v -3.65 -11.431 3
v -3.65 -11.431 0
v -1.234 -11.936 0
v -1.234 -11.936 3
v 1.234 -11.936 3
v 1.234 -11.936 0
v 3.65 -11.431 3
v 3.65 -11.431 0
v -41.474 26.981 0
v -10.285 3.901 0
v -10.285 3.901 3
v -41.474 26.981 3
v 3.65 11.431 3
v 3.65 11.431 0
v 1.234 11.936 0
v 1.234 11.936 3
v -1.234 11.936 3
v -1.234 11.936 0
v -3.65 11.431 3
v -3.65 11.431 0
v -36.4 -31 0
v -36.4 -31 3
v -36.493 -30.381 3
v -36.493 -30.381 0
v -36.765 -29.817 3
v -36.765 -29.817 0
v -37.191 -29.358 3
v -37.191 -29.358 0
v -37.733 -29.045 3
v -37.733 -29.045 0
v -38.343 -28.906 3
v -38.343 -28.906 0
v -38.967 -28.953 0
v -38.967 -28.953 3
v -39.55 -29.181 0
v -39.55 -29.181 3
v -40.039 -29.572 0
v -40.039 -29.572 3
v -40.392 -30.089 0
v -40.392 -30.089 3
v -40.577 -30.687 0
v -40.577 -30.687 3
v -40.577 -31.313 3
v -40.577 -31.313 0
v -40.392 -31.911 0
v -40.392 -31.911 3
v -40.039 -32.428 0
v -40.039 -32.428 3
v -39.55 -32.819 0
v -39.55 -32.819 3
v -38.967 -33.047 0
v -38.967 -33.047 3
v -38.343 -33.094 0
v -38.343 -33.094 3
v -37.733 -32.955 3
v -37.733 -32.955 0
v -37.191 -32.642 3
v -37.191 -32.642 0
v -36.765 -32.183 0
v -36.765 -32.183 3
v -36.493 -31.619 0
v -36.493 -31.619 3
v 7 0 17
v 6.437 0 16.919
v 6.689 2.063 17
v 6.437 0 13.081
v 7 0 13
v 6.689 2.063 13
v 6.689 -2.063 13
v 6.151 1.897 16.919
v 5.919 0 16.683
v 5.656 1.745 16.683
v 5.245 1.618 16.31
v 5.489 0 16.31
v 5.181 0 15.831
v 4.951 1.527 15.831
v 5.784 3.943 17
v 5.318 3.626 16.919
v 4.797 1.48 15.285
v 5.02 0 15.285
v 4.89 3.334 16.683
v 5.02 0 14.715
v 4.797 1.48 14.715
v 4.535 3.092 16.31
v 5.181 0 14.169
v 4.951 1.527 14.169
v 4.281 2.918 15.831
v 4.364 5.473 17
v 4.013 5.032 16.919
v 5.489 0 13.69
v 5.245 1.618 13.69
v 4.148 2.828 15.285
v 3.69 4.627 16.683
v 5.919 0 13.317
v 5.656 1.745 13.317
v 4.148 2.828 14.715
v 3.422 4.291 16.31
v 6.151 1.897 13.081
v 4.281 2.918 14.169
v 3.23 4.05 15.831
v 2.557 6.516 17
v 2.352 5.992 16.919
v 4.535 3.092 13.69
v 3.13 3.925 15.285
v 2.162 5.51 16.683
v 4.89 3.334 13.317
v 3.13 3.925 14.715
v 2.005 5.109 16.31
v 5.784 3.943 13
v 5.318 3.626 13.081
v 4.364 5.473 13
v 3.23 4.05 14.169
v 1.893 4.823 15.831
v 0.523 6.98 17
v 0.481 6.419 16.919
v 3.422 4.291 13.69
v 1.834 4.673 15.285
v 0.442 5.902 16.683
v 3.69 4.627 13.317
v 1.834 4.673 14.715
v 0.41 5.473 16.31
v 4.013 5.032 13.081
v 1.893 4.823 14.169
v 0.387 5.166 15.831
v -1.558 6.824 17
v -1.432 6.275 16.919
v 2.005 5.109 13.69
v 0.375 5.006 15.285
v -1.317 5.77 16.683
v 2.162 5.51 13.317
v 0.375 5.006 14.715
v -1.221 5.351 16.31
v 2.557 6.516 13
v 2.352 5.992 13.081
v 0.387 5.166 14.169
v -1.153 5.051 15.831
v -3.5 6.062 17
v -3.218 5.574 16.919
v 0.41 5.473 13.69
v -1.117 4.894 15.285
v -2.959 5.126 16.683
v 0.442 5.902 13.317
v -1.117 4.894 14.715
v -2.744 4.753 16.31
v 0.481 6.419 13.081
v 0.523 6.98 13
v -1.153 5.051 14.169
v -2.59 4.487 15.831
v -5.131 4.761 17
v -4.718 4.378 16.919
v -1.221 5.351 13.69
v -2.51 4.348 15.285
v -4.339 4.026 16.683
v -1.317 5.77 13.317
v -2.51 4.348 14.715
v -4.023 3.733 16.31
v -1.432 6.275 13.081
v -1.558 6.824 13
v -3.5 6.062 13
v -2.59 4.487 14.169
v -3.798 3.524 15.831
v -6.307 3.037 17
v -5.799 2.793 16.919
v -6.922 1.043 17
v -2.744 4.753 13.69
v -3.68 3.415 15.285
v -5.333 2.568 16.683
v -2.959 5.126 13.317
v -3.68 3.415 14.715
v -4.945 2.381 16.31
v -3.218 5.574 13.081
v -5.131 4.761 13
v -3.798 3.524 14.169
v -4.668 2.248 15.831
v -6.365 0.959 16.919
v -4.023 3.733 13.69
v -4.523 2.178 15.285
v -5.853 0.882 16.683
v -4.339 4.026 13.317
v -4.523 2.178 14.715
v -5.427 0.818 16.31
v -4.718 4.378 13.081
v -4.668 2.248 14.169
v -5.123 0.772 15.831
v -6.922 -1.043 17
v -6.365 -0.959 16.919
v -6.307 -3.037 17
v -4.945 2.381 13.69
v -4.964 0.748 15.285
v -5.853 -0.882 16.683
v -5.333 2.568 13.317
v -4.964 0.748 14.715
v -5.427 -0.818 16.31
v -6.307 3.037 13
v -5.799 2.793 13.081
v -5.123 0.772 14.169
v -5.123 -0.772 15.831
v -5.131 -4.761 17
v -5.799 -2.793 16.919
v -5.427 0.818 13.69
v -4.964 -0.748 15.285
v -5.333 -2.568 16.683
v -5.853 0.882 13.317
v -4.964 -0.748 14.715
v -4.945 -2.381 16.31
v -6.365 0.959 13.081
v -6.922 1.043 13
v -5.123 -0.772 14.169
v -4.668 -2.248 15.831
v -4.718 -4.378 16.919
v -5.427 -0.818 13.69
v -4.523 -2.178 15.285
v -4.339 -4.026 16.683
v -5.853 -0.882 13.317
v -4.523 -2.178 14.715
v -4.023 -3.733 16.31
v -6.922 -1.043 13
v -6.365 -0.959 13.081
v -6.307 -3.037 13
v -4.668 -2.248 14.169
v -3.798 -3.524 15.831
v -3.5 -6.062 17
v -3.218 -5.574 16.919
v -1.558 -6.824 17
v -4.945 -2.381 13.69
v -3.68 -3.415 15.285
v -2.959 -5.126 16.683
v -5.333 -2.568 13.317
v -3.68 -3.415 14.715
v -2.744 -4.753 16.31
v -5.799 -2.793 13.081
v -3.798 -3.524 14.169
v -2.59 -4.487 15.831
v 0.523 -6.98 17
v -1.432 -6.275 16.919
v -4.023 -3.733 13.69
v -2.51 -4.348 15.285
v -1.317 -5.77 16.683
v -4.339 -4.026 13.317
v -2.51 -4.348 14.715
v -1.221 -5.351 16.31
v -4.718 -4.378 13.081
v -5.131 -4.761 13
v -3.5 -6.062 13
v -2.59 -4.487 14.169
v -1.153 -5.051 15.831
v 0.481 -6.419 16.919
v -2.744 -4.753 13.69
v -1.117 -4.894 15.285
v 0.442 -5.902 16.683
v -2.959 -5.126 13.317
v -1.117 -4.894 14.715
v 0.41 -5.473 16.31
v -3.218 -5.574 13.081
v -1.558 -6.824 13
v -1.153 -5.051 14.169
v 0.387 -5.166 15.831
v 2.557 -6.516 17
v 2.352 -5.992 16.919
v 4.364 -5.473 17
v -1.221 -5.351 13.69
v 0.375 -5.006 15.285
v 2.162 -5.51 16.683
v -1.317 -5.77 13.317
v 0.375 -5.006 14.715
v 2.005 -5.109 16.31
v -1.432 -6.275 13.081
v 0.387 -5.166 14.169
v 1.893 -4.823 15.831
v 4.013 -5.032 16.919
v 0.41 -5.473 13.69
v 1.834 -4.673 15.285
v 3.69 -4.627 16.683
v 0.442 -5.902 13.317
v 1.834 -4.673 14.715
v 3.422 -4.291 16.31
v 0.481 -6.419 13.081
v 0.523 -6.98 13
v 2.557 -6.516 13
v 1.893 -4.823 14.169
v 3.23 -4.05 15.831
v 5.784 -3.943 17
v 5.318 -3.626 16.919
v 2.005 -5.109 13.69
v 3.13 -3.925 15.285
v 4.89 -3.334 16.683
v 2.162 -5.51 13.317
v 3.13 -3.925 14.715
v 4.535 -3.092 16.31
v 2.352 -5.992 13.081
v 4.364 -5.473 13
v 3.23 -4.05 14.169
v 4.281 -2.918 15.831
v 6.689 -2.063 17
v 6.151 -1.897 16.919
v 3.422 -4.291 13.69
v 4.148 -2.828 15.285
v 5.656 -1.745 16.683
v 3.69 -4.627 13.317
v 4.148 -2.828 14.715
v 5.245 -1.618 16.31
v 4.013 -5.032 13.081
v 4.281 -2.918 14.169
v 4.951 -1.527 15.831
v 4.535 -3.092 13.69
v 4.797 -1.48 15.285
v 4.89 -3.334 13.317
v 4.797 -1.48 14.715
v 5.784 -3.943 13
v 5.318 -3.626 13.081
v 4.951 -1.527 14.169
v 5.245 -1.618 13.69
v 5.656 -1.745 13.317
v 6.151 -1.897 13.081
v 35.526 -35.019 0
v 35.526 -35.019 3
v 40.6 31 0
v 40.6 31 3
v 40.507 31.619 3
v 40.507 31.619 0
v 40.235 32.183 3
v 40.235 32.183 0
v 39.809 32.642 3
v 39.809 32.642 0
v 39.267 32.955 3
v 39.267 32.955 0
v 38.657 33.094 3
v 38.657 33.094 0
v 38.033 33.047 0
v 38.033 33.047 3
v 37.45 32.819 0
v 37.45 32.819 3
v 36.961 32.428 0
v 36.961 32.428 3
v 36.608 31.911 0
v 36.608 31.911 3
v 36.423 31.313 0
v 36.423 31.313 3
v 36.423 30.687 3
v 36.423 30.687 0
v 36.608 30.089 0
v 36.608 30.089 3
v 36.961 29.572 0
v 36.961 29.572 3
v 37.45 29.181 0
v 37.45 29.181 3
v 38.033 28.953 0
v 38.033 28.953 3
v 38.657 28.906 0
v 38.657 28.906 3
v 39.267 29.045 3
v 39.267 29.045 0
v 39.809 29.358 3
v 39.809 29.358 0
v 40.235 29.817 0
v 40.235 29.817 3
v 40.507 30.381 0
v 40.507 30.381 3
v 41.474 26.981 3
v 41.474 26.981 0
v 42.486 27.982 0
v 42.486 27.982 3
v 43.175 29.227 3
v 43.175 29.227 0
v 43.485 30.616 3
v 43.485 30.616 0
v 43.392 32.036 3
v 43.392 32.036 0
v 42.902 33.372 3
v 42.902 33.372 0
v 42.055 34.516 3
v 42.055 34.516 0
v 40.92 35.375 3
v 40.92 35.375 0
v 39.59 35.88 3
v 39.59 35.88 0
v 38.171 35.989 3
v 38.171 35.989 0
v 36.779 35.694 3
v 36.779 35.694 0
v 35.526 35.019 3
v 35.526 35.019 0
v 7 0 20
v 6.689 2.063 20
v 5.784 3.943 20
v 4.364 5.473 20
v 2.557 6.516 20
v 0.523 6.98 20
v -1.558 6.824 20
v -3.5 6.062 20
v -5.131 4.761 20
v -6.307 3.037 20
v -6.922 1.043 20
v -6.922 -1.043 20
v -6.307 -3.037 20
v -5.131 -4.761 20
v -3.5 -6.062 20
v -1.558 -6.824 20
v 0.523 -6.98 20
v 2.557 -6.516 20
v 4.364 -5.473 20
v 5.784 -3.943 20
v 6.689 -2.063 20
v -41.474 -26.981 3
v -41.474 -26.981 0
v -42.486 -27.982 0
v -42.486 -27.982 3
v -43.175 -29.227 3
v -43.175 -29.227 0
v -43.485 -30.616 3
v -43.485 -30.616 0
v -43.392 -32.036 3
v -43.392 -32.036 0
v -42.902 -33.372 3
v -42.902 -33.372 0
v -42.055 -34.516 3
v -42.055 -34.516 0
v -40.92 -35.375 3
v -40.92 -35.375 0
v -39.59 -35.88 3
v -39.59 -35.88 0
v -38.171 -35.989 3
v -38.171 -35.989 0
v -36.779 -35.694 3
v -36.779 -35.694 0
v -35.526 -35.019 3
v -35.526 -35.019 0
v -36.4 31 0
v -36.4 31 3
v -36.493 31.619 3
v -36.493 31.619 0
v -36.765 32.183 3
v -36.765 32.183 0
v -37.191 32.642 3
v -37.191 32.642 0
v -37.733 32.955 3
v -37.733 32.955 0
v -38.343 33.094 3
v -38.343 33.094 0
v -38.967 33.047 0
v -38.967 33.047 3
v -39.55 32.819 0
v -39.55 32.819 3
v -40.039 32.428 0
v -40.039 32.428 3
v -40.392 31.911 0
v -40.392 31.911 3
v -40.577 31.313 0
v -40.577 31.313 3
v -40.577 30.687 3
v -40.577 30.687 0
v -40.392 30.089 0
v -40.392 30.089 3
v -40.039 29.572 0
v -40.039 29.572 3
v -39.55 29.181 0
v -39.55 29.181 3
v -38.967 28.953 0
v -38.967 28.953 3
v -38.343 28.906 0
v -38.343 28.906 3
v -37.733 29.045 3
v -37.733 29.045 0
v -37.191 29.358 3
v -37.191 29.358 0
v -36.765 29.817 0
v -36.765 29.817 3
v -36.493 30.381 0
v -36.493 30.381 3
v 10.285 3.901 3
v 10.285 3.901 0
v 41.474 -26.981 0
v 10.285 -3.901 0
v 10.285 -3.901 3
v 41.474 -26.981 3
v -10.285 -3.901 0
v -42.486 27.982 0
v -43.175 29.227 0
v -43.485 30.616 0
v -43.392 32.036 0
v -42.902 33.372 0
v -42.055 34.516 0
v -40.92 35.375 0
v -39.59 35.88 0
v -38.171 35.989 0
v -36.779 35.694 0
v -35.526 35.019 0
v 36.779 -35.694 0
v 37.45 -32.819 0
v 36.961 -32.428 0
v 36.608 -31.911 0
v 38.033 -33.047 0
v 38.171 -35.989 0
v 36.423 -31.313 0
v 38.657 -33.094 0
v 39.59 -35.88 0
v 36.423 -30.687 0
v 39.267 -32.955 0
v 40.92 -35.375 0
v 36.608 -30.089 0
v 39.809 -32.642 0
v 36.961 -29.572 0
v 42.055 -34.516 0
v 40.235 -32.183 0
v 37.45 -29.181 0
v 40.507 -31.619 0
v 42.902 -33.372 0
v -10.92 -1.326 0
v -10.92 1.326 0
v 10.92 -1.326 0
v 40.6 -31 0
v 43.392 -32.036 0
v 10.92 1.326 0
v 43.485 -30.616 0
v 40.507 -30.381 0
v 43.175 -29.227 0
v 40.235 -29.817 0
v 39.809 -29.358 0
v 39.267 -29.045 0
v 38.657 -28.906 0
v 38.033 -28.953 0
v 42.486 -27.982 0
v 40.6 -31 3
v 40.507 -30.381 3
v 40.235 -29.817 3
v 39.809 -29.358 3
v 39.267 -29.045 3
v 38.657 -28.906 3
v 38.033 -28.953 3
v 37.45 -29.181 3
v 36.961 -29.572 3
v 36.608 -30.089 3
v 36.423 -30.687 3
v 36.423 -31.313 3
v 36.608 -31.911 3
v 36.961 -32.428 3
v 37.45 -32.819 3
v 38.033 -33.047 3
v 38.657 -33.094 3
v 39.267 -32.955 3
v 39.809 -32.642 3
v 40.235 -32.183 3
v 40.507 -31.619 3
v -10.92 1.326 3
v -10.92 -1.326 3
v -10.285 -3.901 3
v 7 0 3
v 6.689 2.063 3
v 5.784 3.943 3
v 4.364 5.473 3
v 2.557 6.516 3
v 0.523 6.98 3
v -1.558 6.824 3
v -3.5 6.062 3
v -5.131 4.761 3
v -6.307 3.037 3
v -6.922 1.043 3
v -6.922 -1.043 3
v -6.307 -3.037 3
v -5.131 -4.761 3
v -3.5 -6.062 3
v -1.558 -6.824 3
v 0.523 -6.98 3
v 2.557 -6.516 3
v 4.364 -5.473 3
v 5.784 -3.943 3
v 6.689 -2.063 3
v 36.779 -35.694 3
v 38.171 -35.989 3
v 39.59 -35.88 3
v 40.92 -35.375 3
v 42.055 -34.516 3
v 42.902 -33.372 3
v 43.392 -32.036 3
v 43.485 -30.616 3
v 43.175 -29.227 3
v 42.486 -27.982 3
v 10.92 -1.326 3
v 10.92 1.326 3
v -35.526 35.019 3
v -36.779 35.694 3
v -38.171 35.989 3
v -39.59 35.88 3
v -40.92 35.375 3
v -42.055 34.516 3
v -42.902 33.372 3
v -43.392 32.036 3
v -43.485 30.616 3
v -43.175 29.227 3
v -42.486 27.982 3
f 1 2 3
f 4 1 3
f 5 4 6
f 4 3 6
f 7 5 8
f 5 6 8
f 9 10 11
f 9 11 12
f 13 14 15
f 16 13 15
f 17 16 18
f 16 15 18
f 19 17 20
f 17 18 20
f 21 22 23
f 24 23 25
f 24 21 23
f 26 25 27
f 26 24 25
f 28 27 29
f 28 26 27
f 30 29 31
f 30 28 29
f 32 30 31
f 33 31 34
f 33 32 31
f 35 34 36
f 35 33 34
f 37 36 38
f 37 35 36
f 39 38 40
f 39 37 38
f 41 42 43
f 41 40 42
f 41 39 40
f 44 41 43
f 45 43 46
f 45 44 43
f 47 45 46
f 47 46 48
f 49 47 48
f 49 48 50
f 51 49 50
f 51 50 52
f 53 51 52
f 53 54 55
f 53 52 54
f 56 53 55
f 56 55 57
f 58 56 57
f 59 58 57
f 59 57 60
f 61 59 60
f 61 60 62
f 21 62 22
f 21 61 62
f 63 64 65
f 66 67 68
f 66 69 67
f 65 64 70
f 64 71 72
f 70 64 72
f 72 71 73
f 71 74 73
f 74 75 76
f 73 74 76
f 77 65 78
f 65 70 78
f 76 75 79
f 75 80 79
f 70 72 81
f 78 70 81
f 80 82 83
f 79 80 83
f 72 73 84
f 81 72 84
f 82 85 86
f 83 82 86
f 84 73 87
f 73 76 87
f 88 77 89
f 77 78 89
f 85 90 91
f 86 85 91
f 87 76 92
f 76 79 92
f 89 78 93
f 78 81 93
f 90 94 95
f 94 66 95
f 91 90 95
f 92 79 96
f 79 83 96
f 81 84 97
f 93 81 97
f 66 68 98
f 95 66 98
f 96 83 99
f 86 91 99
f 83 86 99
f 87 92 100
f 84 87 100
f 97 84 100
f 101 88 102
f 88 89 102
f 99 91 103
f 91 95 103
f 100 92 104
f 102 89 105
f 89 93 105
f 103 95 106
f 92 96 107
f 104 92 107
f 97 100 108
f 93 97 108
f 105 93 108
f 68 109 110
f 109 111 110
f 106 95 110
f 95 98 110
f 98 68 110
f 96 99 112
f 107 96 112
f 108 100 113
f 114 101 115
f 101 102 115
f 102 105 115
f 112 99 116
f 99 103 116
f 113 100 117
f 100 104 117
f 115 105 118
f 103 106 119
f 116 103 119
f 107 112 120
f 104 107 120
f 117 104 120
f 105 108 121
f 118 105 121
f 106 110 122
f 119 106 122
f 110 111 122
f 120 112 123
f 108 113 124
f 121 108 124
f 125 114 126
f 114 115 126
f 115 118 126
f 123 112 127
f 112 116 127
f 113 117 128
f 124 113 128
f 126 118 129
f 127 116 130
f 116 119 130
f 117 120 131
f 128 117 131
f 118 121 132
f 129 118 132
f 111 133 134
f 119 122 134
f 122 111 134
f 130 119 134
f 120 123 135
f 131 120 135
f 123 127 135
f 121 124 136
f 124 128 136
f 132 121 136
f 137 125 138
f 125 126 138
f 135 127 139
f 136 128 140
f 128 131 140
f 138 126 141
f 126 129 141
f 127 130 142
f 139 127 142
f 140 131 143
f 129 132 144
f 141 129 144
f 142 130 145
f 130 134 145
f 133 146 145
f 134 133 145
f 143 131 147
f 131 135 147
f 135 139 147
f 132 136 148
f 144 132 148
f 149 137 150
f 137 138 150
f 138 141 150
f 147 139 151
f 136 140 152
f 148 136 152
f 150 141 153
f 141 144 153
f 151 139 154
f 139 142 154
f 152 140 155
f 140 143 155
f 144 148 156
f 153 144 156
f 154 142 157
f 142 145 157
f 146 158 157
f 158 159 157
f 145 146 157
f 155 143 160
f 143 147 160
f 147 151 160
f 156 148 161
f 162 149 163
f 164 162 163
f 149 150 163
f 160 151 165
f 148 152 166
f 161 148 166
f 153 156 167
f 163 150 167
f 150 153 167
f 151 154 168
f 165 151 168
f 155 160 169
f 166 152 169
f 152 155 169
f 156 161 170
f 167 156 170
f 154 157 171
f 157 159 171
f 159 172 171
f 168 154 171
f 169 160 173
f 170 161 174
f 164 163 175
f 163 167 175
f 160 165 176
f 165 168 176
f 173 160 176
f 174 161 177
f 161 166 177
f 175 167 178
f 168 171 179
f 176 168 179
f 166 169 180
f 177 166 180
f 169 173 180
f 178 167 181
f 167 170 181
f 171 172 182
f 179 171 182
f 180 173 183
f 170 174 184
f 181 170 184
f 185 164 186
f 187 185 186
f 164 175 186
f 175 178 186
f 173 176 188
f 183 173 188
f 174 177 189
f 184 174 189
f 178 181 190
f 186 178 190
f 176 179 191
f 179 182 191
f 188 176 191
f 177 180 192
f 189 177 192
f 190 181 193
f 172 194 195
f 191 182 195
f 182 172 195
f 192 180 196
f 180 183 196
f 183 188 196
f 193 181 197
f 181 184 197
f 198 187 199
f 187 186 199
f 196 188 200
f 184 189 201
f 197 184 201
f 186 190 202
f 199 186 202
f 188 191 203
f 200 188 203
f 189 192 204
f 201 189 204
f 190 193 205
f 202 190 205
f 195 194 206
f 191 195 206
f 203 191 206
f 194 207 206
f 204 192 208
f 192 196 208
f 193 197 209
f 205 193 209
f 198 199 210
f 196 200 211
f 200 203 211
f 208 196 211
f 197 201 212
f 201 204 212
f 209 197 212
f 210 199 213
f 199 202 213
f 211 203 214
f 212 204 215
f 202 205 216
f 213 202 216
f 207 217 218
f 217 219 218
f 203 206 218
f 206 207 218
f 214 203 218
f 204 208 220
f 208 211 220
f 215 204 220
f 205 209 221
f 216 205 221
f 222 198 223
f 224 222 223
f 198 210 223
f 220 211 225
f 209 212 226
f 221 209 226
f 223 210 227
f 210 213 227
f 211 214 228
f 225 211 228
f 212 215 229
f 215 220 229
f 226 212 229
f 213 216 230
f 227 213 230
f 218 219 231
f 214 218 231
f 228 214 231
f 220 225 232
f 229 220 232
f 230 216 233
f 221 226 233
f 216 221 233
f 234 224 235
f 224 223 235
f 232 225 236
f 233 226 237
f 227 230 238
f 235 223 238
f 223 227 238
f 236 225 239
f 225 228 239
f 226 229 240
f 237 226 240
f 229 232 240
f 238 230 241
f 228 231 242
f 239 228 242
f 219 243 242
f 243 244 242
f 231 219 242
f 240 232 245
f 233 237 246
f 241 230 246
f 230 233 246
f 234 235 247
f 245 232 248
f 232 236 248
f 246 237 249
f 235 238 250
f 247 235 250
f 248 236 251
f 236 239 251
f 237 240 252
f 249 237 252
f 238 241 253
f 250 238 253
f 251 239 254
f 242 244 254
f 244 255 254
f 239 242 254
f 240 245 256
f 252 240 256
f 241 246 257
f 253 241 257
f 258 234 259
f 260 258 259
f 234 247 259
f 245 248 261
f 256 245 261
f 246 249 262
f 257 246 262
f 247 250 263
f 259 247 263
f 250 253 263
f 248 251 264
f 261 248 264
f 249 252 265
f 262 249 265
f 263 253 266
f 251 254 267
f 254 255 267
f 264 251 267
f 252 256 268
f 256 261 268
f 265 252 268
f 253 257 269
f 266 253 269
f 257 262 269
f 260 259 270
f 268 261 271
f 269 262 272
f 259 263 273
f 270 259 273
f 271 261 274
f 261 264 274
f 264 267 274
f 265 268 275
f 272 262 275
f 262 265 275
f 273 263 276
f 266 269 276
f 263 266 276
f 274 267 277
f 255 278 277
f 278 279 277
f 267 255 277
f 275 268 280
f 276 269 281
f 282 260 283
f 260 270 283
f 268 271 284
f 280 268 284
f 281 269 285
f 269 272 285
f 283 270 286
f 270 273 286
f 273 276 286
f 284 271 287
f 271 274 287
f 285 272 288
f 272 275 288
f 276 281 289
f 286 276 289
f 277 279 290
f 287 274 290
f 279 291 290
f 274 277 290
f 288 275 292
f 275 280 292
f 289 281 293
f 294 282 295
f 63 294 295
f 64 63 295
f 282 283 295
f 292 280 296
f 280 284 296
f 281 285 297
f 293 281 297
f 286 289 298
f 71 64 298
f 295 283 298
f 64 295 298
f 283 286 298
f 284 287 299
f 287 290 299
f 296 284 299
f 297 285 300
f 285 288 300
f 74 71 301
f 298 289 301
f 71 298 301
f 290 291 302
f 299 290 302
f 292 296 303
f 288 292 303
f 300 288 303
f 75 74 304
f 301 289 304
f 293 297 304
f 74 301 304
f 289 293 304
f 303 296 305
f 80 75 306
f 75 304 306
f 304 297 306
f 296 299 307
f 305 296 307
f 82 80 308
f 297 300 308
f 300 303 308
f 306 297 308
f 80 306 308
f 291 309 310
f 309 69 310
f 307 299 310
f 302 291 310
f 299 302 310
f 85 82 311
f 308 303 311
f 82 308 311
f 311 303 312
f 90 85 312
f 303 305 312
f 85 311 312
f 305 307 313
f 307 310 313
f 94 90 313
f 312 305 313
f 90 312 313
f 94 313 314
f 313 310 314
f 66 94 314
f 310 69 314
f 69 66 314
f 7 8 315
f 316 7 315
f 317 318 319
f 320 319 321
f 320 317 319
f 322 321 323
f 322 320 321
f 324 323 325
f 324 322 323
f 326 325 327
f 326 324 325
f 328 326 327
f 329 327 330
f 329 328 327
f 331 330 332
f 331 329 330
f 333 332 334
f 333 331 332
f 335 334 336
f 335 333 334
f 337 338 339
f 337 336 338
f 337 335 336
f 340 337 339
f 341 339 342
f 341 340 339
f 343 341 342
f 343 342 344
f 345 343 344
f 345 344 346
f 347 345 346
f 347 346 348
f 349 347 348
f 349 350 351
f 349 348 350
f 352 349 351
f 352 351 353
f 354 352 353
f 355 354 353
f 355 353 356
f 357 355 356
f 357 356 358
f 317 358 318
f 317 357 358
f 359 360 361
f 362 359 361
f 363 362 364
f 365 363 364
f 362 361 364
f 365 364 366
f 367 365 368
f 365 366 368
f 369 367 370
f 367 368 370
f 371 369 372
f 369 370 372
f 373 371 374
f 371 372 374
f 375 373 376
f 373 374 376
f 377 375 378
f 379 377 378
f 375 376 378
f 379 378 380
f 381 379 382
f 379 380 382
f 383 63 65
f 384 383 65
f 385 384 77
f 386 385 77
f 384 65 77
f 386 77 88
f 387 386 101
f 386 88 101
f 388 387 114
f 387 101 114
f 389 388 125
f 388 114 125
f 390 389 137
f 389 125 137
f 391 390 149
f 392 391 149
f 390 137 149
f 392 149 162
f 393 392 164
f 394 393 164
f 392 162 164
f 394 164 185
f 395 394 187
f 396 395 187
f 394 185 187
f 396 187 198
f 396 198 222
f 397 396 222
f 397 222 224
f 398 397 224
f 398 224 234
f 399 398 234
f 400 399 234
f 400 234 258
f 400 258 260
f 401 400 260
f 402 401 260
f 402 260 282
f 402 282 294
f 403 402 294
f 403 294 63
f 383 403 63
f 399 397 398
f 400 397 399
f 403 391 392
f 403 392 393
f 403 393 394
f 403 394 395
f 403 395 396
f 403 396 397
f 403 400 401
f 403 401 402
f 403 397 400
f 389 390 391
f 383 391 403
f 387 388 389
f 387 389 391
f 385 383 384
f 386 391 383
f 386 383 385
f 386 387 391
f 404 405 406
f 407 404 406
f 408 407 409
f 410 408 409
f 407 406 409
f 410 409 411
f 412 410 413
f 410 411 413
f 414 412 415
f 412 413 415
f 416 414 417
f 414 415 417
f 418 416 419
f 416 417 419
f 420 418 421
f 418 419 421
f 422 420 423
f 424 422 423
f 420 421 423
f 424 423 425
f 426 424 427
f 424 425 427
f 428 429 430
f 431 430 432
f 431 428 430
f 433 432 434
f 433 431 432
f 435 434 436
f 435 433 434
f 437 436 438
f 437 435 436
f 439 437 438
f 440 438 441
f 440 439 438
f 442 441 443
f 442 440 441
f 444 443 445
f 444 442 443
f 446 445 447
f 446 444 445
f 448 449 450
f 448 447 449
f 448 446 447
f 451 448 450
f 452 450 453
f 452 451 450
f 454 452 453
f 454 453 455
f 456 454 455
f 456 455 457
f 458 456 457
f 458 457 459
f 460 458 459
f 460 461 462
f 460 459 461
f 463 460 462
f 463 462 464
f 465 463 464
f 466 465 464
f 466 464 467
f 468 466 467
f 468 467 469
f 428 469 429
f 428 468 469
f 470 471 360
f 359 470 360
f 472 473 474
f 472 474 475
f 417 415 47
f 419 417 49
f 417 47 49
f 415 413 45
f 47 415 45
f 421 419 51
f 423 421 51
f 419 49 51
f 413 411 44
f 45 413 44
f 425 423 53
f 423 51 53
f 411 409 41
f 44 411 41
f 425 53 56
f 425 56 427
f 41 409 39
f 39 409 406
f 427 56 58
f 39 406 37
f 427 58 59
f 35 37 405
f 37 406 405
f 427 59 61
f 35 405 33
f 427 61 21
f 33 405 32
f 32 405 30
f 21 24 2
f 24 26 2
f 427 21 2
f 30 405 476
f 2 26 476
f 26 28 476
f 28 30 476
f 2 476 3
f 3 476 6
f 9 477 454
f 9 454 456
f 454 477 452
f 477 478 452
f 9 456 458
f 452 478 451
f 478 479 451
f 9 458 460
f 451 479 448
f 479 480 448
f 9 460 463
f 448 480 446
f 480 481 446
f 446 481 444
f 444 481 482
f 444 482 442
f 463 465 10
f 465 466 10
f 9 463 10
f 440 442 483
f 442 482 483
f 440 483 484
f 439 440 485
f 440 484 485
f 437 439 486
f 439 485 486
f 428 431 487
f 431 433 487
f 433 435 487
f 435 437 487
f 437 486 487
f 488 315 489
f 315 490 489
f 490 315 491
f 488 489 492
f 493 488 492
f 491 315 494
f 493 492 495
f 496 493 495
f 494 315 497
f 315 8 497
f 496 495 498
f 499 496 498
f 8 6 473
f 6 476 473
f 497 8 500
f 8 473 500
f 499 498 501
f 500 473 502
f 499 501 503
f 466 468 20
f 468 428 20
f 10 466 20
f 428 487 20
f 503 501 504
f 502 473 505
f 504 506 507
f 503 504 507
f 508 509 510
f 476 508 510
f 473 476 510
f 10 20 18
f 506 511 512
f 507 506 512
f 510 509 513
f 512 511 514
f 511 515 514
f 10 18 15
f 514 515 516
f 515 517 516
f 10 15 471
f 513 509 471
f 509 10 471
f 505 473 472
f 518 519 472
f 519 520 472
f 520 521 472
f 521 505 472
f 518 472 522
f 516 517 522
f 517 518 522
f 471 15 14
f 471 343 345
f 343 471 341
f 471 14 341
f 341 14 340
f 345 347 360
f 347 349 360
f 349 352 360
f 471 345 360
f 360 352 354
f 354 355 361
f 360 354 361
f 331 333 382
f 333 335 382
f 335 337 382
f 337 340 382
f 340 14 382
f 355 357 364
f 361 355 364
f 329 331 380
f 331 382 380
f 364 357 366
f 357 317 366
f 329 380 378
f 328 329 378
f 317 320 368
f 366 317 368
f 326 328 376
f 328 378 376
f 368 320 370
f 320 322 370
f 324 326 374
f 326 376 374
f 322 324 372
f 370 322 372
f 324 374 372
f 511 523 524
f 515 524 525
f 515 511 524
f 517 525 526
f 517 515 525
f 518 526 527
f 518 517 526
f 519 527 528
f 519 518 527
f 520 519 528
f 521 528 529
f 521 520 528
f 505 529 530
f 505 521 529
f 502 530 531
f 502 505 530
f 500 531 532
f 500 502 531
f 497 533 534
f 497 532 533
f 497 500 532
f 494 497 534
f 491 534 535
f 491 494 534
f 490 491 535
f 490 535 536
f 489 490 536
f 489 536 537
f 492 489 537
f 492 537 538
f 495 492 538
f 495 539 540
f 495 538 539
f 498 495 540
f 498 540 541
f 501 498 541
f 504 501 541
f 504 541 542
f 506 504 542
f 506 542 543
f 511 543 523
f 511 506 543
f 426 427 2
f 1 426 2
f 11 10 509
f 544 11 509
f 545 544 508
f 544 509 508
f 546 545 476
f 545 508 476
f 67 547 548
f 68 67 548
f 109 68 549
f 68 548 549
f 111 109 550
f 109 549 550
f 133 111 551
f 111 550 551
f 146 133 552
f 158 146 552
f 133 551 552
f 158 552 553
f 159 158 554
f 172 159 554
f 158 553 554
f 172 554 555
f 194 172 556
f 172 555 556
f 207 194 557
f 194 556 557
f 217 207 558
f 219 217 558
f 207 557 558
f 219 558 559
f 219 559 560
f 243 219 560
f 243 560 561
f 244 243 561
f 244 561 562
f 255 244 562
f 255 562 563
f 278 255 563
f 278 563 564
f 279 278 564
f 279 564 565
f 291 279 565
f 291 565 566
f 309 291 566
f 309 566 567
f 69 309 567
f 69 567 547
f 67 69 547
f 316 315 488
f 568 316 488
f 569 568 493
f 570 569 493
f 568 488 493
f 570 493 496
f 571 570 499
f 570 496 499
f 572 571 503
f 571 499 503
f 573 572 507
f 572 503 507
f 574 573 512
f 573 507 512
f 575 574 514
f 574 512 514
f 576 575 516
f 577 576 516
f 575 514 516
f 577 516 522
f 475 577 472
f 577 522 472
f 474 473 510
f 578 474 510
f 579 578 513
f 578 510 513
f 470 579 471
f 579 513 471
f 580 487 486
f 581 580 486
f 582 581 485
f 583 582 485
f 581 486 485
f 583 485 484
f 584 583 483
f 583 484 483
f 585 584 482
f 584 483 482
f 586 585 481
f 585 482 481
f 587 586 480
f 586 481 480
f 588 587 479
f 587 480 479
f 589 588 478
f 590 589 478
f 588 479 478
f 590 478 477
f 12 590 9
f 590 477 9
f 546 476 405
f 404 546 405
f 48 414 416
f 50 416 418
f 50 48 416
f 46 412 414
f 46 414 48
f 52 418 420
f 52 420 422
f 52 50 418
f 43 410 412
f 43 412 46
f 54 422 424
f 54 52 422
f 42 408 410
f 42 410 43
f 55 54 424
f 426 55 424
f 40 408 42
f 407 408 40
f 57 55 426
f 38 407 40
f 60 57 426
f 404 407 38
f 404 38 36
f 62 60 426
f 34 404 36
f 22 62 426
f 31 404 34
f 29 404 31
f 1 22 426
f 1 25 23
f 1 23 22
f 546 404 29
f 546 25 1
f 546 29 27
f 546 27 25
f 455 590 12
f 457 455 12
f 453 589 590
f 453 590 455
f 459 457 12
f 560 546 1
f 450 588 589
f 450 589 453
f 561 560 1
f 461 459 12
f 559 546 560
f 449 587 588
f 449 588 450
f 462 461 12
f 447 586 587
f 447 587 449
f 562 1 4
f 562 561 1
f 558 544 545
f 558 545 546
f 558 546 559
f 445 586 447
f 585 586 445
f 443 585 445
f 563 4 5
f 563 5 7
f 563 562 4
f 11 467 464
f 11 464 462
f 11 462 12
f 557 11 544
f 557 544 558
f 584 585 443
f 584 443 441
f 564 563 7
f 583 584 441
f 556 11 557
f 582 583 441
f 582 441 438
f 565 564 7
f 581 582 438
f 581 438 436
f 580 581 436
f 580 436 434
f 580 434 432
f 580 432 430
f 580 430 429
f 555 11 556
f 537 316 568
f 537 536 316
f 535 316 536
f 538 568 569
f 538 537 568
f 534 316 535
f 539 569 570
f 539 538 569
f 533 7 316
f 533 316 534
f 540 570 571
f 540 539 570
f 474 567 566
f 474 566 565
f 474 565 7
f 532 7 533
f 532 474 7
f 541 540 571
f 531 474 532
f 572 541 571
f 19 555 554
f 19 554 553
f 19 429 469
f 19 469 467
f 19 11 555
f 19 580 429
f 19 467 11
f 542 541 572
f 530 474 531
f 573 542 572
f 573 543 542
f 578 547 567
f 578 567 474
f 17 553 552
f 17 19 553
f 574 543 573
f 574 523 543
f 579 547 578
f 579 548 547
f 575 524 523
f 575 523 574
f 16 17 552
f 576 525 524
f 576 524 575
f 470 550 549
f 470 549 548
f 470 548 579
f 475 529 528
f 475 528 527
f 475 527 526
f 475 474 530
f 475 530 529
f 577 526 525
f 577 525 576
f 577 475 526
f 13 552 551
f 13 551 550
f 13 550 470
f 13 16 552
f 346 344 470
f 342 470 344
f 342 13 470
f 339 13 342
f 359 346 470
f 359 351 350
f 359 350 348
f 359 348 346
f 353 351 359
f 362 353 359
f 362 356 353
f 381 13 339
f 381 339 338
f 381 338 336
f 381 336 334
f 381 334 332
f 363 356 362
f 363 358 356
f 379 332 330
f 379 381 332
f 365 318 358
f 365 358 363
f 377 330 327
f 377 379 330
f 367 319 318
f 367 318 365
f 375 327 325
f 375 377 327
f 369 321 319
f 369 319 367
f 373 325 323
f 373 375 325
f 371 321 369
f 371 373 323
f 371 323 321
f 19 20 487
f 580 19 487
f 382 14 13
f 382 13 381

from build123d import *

# Parameters (mm, degrees)
TORUS_R           = 2
CYLINDER001_R     = 2.1
CYLINDER001_DEPTH = 10
ARRAY_X_COUNT     = 2
ARRAY_X_PITCH     = 77
ARRAY_Y_COUNT     = 2
ARRAY_Y_PITCH     = 62
PAD002_DEPTH      = 3
CYLINDER_R        = 7
CYLINDER_DEPTH    = 20


with BuildPart() as torus:
    # Torus → Torus (revolve)
    with BuildSketch(Plane(origin=(0, 0, 15), x_dir=(1, 0, 0), z_dir=(0, -1, 0))):
        with Locations((7, 0)):
            Circle(TORUS_R)
    revolve(axis=Axis((0, 0, 15), (0, 0, 1)))


with BuildPart() as extract_fusion:
    # Cylinder001 → Cylinder001 (new body)
    with BuildSketch(Plane.XY):
        Circle(CYLINDER001_R)
    extrude(amount=CYLINDER001_DEPTH)

    # Array X: extract fusion ×2


with BuildPart() as extract_fusion_1:
    add(extract_fusion.part)
    with Locations(*[(i * ARRAY_X_PITCH, 0, 0) for i in range(1, ARRAY_X_COUNT)]):
        add(extract_fusion.part)

    # Array Y: extract fusion ×2


with BuildPart() as extract_fusion_2:
    add(extract_fusion_1.part)
    with Locations(*[(0, i * ARRAY_Y_PITCH, 0) for i in range(1, ARRAY_Y_COUNT)]):
        add(extract_fusion_1.part)


with BuildPart() as extract_fusion_3:
    # Array placement: moved
    add(extract_fusion_2.part.moved(Location((-38.5, -31, 0))))

    # Fusion: union Torus
    add(torus.part)


with BuildPart() as base_body:
    # Sketch002 → Pad002 (new body)
    with BuildSketch(Plane.XY):
        with BuildLine():
            Line((-10.285127, -3.90079), (-41.474221, -26.980795))
            ThreePointArc((-41.474221, -26.980795), (-42.519205, -33.974221), (-35.525779, -35.019205))
            Line((-35.525779, -35.019205), (-3.650353, -11.431313))
            ThreePointArc((-3.650353, -11.431313), (0, -12), (3.650353, -11.431313))
            Line((3.650353, -11.431313), (35.525779, -35.019205))
            ThreePointArc((35.525779, -35.019205), (42.519205, -33.974221), (41.474221, -26.980795))
            Line((10.285127, -3.90079), (41.474221, -26.980795))
            ThreePointArc((10.285127, -3.90079), (11, 0), (10.285127, 3.90079))
            Line((10.285127, 3.90079), (41.474221, 26.980795))
            ThreePointArc((41.474221, 26.980795), (42.519205, 33.974221), (35.525779, 35.019205))
            Line((3.650353, 11.431313), (35.525779, 35.019205))
            ThreePointArc((3.650353, 11.431313), (0, 12), (-3.650353, 11.431313))
            Line((-3.650353, 11.431313), (-35.525779, 35.019205))
            ThreePointArc((-35.525779, 35.019205), (-42.519205, 33.974221), (-41.474221, 26.980795))
            Line((-10.285127, 3.90079), (-41.474221, 26.980795))
            ThreePointArc((-10.285127, 3.90079), (-11, 0), (-10.285127, -3.90079))
        make_face()
    extrude(amount=PAD002_DEPTH)


with BuildPart() as base_cut:
    # Cylinder → Cylinder (new body)
    with BuildSketch(Plane.XY):
        Circle(CYLINDER_R)
    extrude(amount=CYLINDER_DEPTH)

    # Fusion001: union base body
    add(base_body.part)

    # Cut: cut extract fusion
    add(extract_fusion_3.part, mode=Mode.SUBTRACT)


solid = base_cut.part
